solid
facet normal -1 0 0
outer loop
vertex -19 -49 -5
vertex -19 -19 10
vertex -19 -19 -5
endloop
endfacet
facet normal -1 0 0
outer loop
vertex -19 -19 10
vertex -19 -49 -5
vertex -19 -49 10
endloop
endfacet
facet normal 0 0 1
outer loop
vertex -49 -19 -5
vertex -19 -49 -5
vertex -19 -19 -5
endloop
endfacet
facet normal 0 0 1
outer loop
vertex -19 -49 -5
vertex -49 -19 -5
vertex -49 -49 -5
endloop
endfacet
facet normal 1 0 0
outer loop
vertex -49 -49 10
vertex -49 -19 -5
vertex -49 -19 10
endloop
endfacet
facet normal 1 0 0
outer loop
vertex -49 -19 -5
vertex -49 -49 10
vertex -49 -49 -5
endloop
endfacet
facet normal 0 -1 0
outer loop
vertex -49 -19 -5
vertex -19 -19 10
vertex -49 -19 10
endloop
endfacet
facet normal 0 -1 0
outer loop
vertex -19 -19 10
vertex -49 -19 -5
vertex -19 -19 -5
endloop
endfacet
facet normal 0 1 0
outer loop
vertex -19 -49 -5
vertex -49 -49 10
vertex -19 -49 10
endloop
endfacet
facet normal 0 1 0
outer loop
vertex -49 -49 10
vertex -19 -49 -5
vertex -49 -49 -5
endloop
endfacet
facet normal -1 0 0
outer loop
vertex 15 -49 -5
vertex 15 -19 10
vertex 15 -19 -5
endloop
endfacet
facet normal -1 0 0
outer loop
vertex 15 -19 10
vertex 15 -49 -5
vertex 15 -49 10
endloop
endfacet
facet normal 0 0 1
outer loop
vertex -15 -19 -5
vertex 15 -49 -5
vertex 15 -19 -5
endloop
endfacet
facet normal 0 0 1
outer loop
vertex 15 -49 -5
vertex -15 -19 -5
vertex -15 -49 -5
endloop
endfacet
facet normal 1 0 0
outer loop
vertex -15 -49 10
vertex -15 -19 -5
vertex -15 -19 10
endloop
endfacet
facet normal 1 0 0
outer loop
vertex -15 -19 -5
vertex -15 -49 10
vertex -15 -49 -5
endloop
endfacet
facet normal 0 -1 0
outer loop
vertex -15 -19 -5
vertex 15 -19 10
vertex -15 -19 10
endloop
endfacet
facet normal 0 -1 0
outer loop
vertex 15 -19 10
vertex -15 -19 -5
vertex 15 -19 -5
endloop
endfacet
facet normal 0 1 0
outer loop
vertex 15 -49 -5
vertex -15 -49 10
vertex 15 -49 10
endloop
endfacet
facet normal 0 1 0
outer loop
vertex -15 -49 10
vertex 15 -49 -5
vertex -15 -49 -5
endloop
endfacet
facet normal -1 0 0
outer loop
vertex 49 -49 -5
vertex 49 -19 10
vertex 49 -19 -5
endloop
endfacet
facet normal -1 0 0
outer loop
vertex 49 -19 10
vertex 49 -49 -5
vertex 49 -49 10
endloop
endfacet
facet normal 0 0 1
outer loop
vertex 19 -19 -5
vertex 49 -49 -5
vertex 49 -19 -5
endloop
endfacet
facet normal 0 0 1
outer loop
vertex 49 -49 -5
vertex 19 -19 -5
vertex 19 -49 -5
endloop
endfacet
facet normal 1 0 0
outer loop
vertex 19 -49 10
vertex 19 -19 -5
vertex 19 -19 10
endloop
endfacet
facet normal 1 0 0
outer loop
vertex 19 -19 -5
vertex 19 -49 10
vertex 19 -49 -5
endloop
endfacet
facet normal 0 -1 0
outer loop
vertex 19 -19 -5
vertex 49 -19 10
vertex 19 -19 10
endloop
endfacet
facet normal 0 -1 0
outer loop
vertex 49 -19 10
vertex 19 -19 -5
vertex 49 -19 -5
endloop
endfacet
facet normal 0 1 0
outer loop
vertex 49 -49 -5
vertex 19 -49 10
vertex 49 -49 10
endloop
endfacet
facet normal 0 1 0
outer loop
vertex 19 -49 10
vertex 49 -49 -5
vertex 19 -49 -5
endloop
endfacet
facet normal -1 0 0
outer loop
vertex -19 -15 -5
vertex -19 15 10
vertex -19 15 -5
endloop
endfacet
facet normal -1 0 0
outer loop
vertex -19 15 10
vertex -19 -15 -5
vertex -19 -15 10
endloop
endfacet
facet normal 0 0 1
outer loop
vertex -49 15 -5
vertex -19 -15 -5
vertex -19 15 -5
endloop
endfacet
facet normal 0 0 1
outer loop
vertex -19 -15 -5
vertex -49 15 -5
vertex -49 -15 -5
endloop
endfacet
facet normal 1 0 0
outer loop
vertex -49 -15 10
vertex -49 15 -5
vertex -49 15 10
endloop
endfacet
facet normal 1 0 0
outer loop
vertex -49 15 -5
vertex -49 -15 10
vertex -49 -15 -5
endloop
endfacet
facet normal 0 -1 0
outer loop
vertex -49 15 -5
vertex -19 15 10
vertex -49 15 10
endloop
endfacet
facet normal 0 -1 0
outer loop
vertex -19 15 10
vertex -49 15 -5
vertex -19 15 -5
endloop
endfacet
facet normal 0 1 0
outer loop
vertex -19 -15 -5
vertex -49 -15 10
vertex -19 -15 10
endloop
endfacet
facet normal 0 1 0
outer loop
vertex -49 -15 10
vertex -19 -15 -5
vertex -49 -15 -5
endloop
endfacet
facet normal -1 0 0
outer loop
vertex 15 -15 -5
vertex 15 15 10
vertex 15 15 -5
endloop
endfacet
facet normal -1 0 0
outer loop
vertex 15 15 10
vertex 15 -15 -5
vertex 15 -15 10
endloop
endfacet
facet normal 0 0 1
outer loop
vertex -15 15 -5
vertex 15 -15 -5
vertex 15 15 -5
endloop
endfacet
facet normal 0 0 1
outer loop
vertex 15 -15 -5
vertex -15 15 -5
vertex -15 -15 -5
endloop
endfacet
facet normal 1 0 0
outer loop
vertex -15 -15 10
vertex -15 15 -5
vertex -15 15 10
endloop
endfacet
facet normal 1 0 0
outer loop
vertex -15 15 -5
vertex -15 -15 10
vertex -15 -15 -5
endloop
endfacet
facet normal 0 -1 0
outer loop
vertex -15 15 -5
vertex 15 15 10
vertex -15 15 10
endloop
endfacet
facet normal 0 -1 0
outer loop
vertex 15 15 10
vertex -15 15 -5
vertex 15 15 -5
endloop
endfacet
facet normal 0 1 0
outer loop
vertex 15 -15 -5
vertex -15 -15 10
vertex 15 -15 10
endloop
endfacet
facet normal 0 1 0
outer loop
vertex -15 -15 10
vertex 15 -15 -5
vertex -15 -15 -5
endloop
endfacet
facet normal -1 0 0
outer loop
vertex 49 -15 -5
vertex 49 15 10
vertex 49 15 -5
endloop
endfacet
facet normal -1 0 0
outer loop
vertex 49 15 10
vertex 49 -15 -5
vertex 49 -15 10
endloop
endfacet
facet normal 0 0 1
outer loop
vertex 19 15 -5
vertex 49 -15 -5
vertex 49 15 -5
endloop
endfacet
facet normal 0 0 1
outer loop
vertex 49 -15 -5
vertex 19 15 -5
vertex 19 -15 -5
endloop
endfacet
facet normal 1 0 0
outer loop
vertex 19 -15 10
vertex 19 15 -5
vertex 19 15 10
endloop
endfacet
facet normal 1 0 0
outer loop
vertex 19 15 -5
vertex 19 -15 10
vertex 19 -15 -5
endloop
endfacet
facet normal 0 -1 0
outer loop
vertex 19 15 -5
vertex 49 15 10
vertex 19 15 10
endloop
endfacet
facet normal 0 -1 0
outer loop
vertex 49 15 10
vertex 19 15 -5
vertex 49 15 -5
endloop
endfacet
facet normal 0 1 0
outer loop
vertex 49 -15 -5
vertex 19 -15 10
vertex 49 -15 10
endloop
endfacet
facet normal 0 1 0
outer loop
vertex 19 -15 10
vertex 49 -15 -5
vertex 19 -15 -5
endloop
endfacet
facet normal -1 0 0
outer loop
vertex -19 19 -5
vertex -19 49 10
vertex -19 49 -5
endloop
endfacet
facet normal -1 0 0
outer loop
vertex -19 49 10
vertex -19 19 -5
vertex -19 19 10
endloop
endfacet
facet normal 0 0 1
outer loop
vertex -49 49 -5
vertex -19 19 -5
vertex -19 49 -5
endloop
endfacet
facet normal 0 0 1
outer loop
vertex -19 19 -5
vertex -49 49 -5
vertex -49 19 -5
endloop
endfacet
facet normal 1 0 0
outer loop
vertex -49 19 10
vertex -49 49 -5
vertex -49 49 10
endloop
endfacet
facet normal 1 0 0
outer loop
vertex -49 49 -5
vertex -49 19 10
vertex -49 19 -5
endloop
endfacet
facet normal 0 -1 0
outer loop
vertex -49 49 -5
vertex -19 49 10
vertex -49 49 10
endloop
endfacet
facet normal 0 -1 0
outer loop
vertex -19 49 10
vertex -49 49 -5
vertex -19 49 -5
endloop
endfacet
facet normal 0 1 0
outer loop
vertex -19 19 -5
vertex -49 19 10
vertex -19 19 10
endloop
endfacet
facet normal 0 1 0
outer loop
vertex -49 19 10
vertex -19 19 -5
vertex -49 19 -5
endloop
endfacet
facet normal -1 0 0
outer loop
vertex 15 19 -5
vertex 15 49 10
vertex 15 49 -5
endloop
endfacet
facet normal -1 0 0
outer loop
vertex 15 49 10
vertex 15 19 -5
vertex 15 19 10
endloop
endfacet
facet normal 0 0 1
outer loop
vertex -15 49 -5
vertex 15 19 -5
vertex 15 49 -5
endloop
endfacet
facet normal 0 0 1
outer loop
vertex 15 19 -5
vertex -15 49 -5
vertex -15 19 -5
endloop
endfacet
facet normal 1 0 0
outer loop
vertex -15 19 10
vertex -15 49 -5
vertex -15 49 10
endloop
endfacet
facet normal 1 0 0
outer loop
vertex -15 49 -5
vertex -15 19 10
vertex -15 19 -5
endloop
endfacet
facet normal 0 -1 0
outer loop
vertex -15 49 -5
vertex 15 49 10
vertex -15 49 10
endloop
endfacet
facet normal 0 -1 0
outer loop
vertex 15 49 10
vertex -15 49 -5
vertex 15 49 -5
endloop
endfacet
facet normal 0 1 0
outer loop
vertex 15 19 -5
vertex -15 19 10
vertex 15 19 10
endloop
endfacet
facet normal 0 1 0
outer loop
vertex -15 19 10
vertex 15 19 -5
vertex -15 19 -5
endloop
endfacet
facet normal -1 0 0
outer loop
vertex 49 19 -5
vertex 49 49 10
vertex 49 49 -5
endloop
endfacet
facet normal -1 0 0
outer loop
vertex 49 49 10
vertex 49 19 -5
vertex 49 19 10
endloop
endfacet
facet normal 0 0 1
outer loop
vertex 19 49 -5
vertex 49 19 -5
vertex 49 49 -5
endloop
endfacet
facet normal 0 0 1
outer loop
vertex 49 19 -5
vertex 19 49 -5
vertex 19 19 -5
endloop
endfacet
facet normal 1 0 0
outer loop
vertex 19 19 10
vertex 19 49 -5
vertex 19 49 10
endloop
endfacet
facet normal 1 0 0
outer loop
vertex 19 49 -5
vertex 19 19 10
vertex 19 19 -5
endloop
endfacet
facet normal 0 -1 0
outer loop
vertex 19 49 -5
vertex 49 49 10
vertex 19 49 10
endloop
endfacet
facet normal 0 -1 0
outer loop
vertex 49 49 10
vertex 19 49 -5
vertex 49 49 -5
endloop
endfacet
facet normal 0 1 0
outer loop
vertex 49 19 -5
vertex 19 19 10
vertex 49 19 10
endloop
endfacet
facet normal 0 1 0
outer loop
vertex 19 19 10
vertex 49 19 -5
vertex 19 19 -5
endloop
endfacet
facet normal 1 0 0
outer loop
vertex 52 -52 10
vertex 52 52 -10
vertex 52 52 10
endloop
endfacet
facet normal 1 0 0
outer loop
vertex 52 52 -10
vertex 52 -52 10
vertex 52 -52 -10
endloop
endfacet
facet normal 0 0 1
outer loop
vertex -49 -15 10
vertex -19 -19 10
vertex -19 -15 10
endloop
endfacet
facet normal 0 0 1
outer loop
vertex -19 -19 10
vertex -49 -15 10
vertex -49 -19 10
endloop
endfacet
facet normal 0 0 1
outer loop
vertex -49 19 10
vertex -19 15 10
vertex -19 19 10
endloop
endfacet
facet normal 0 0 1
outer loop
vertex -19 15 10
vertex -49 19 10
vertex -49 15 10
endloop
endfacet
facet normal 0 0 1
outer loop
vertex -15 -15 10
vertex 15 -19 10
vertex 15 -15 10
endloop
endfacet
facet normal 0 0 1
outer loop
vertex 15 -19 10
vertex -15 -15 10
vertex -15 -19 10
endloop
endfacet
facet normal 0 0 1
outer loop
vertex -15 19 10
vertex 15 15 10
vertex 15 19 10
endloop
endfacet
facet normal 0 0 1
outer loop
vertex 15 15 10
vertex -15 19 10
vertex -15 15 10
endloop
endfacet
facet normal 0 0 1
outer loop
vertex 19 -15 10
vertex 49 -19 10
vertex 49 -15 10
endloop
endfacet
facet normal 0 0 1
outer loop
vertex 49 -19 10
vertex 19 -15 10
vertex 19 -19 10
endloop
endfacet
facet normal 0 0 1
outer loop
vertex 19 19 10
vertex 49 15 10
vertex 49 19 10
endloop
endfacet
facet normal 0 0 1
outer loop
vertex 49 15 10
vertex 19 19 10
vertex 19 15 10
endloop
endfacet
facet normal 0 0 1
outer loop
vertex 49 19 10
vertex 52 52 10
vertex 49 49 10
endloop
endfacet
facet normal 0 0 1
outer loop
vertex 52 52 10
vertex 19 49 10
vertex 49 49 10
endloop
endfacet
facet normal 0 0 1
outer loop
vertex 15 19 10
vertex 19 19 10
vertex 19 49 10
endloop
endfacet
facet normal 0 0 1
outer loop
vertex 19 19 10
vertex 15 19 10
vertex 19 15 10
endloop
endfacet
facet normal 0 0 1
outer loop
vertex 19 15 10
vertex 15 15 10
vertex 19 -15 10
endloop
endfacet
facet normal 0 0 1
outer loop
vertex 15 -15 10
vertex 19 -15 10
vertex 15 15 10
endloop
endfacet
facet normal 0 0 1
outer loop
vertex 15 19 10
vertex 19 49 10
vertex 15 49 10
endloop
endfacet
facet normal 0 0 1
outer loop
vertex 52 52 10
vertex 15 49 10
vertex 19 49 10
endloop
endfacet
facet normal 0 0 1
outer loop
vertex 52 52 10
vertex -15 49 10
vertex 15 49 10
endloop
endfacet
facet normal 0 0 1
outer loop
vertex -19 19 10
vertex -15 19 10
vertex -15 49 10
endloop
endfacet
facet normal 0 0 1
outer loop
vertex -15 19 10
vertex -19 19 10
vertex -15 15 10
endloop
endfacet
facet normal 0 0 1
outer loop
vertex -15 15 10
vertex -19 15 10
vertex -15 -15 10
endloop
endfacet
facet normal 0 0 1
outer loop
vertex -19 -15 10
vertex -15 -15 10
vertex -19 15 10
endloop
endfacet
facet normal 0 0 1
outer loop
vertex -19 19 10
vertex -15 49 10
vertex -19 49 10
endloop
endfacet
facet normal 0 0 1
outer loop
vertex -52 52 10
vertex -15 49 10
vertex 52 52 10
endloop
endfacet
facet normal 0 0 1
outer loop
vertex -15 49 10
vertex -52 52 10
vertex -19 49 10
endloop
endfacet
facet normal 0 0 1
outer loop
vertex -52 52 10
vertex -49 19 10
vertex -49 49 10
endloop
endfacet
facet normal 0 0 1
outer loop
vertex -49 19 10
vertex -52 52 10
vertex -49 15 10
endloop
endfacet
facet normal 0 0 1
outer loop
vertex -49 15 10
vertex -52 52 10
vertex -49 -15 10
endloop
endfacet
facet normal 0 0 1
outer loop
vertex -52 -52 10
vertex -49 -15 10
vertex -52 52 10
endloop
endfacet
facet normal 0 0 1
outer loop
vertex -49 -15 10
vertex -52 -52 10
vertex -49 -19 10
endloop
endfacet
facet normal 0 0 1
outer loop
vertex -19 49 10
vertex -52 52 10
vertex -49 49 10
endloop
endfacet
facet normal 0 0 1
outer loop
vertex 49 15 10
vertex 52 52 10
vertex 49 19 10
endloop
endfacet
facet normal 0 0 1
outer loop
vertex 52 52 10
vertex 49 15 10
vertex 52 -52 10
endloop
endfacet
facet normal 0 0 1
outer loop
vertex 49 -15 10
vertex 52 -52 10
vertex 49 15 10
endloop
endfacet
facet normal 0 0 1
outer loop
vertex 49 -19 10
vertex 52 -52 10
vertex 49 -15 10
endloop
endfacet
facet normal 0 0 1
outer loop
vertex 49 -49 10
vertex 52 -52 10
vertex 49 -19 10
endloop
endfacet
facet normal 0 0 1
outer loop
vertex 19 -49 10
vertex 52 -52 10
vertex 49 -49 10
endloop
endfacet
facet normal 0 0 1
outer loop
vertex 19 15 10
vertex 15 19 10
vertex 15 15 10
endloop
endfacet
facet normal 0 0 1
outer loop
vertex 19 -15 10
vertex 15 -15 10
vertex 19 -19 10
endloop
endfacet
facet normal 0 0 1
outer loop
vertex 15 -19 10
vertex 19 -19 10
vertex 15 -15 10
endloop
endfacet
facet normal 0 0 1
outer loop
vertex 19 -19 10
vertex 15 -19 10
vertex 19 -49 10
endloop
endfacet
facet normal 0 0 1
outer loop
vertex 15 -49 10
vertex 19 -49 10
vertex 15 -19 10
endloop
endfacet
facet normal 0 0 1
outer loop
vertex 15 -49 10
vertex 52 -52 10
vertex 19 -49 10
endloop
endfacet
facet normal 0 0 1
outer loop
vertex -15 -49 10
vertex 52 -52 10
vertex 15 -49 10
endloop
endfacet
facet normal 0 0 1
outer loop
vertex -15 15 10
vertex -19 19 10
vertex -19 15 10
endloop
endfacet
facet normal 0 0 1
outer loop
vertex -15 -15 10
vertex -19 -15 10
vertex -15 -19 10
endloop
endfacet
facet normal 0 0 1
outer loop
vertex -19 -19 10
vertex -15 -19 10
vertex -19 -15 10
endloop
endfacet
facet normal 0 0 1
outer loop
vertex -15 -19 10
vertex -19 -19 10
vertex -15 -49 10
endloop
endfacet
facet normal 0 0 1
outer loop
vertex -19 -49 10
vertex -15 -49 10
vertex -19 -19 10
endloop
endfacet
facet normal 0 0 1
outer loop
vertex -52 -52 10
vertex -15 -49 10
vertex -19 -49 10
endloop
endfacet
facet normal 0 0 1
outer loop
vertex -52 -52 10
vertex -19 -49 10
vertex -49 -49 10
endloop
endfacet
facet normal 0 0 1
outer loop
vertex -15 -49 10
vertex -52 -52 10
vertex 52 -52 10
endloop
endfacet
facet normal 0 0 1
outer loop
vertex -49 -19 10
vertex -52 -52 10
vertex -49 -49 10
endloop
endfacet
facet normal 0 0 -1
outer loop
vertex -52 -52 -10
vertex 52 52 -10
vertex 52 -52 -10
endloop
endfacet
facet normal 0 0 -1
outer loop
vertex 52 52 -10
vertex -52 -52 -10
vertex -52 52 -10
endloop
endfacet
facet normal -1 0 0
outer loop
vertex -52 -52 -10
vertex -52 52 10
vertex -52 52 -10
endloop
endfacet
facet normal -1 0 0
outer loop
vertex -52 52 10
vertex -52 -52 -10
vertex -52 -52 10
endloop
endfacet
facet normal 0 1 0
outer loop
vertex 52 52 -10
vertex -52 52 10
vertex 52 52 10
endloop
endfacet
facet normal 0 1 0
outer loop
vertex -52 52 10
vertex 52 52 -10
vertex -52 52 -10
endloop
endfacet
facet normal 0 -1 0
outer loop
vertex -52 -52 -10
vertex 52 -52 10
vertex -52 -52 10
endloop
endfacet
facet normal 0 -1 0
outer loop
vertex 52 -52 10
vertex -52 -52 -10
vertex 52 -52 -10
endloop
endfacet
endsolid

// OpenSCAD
$fn = 32;

// ----------------------------------------------------------------------
// Pocket plate 104 x 104 x 20
// 3 x 3 pockets 30 mm square, 15 mm deep
// ----------------------------------------------------------------------

// --- parameters (mm) ---
thickness = 20;  // plate thickness
floor_t = 5;     // material left under each pocket
pocket = 30;     // pocket side length
pitch_x = 34;    // pocket pitch along X
pitch_y = 34;    // pocket pitch along Y
cols = 3;        // pockets per row
rows = 3;        // rows of pockets

// --- derived feature positions (mm) ---
depth = thickness - floor_t;        // = 15   pocket depth, down to the floor
span_x = (cols - 1) * pitch_x;      // = 68   distance between outer pockets
span_y = (rows - 1) * pitch_y;      // = 68   distance between outer pocket rows
origin_x = -span_x / 2;             // = -34   X of the first pocket
origin_y = -span_y / 2;             // = -34   Y of the first pocket
plate = [span_x + pocket + 6, span_y + pocket + 6, thickness];  // = [104, 104, 20]   overall size: pockets plus 3 mm of wall on each side
feature_centers = [
  [origin_x + 0 * pitch_x, origin_y + 0 * pitch_y],
  [origin_x + 1 * pitch_x, origin_y + 0 * pitch_y],
  [origin_x + 2 * pitch_x, origin_y + 0 * pitch_y],
  [origin_x + 0 * pitch_x, origin_y + 1 * pitch_y],
  [origin_x + 1 * pitch_x, origin_y + 1 * pitch_y],
  [origin_x + 2 * pitch_x, origin_y + 1 * pitch_y],
  [origin_x + 0 * pitch_x, origin_y + 2 * pitch_y],
  [origin_x + 1 * pitch_x, origin_y + 2 * pitch_y],
  [origin_x + 2 * pitch_x, origin_y + 2 * pitch_y]
];   // pocket centres, used verbatim by the cutter loop

// plate outline, then one pocket per centre in feature_centers
difference() {
  cube(plate, center = true);
  for (centre = feature_centers)
    translate([centre[0] - pocket / 2, centre[1] - pocket / 2, plate[2] / 2 - depth])
      cube([pocket, pocket, depth + 1]);  // centred on the declared pocket centre
}
